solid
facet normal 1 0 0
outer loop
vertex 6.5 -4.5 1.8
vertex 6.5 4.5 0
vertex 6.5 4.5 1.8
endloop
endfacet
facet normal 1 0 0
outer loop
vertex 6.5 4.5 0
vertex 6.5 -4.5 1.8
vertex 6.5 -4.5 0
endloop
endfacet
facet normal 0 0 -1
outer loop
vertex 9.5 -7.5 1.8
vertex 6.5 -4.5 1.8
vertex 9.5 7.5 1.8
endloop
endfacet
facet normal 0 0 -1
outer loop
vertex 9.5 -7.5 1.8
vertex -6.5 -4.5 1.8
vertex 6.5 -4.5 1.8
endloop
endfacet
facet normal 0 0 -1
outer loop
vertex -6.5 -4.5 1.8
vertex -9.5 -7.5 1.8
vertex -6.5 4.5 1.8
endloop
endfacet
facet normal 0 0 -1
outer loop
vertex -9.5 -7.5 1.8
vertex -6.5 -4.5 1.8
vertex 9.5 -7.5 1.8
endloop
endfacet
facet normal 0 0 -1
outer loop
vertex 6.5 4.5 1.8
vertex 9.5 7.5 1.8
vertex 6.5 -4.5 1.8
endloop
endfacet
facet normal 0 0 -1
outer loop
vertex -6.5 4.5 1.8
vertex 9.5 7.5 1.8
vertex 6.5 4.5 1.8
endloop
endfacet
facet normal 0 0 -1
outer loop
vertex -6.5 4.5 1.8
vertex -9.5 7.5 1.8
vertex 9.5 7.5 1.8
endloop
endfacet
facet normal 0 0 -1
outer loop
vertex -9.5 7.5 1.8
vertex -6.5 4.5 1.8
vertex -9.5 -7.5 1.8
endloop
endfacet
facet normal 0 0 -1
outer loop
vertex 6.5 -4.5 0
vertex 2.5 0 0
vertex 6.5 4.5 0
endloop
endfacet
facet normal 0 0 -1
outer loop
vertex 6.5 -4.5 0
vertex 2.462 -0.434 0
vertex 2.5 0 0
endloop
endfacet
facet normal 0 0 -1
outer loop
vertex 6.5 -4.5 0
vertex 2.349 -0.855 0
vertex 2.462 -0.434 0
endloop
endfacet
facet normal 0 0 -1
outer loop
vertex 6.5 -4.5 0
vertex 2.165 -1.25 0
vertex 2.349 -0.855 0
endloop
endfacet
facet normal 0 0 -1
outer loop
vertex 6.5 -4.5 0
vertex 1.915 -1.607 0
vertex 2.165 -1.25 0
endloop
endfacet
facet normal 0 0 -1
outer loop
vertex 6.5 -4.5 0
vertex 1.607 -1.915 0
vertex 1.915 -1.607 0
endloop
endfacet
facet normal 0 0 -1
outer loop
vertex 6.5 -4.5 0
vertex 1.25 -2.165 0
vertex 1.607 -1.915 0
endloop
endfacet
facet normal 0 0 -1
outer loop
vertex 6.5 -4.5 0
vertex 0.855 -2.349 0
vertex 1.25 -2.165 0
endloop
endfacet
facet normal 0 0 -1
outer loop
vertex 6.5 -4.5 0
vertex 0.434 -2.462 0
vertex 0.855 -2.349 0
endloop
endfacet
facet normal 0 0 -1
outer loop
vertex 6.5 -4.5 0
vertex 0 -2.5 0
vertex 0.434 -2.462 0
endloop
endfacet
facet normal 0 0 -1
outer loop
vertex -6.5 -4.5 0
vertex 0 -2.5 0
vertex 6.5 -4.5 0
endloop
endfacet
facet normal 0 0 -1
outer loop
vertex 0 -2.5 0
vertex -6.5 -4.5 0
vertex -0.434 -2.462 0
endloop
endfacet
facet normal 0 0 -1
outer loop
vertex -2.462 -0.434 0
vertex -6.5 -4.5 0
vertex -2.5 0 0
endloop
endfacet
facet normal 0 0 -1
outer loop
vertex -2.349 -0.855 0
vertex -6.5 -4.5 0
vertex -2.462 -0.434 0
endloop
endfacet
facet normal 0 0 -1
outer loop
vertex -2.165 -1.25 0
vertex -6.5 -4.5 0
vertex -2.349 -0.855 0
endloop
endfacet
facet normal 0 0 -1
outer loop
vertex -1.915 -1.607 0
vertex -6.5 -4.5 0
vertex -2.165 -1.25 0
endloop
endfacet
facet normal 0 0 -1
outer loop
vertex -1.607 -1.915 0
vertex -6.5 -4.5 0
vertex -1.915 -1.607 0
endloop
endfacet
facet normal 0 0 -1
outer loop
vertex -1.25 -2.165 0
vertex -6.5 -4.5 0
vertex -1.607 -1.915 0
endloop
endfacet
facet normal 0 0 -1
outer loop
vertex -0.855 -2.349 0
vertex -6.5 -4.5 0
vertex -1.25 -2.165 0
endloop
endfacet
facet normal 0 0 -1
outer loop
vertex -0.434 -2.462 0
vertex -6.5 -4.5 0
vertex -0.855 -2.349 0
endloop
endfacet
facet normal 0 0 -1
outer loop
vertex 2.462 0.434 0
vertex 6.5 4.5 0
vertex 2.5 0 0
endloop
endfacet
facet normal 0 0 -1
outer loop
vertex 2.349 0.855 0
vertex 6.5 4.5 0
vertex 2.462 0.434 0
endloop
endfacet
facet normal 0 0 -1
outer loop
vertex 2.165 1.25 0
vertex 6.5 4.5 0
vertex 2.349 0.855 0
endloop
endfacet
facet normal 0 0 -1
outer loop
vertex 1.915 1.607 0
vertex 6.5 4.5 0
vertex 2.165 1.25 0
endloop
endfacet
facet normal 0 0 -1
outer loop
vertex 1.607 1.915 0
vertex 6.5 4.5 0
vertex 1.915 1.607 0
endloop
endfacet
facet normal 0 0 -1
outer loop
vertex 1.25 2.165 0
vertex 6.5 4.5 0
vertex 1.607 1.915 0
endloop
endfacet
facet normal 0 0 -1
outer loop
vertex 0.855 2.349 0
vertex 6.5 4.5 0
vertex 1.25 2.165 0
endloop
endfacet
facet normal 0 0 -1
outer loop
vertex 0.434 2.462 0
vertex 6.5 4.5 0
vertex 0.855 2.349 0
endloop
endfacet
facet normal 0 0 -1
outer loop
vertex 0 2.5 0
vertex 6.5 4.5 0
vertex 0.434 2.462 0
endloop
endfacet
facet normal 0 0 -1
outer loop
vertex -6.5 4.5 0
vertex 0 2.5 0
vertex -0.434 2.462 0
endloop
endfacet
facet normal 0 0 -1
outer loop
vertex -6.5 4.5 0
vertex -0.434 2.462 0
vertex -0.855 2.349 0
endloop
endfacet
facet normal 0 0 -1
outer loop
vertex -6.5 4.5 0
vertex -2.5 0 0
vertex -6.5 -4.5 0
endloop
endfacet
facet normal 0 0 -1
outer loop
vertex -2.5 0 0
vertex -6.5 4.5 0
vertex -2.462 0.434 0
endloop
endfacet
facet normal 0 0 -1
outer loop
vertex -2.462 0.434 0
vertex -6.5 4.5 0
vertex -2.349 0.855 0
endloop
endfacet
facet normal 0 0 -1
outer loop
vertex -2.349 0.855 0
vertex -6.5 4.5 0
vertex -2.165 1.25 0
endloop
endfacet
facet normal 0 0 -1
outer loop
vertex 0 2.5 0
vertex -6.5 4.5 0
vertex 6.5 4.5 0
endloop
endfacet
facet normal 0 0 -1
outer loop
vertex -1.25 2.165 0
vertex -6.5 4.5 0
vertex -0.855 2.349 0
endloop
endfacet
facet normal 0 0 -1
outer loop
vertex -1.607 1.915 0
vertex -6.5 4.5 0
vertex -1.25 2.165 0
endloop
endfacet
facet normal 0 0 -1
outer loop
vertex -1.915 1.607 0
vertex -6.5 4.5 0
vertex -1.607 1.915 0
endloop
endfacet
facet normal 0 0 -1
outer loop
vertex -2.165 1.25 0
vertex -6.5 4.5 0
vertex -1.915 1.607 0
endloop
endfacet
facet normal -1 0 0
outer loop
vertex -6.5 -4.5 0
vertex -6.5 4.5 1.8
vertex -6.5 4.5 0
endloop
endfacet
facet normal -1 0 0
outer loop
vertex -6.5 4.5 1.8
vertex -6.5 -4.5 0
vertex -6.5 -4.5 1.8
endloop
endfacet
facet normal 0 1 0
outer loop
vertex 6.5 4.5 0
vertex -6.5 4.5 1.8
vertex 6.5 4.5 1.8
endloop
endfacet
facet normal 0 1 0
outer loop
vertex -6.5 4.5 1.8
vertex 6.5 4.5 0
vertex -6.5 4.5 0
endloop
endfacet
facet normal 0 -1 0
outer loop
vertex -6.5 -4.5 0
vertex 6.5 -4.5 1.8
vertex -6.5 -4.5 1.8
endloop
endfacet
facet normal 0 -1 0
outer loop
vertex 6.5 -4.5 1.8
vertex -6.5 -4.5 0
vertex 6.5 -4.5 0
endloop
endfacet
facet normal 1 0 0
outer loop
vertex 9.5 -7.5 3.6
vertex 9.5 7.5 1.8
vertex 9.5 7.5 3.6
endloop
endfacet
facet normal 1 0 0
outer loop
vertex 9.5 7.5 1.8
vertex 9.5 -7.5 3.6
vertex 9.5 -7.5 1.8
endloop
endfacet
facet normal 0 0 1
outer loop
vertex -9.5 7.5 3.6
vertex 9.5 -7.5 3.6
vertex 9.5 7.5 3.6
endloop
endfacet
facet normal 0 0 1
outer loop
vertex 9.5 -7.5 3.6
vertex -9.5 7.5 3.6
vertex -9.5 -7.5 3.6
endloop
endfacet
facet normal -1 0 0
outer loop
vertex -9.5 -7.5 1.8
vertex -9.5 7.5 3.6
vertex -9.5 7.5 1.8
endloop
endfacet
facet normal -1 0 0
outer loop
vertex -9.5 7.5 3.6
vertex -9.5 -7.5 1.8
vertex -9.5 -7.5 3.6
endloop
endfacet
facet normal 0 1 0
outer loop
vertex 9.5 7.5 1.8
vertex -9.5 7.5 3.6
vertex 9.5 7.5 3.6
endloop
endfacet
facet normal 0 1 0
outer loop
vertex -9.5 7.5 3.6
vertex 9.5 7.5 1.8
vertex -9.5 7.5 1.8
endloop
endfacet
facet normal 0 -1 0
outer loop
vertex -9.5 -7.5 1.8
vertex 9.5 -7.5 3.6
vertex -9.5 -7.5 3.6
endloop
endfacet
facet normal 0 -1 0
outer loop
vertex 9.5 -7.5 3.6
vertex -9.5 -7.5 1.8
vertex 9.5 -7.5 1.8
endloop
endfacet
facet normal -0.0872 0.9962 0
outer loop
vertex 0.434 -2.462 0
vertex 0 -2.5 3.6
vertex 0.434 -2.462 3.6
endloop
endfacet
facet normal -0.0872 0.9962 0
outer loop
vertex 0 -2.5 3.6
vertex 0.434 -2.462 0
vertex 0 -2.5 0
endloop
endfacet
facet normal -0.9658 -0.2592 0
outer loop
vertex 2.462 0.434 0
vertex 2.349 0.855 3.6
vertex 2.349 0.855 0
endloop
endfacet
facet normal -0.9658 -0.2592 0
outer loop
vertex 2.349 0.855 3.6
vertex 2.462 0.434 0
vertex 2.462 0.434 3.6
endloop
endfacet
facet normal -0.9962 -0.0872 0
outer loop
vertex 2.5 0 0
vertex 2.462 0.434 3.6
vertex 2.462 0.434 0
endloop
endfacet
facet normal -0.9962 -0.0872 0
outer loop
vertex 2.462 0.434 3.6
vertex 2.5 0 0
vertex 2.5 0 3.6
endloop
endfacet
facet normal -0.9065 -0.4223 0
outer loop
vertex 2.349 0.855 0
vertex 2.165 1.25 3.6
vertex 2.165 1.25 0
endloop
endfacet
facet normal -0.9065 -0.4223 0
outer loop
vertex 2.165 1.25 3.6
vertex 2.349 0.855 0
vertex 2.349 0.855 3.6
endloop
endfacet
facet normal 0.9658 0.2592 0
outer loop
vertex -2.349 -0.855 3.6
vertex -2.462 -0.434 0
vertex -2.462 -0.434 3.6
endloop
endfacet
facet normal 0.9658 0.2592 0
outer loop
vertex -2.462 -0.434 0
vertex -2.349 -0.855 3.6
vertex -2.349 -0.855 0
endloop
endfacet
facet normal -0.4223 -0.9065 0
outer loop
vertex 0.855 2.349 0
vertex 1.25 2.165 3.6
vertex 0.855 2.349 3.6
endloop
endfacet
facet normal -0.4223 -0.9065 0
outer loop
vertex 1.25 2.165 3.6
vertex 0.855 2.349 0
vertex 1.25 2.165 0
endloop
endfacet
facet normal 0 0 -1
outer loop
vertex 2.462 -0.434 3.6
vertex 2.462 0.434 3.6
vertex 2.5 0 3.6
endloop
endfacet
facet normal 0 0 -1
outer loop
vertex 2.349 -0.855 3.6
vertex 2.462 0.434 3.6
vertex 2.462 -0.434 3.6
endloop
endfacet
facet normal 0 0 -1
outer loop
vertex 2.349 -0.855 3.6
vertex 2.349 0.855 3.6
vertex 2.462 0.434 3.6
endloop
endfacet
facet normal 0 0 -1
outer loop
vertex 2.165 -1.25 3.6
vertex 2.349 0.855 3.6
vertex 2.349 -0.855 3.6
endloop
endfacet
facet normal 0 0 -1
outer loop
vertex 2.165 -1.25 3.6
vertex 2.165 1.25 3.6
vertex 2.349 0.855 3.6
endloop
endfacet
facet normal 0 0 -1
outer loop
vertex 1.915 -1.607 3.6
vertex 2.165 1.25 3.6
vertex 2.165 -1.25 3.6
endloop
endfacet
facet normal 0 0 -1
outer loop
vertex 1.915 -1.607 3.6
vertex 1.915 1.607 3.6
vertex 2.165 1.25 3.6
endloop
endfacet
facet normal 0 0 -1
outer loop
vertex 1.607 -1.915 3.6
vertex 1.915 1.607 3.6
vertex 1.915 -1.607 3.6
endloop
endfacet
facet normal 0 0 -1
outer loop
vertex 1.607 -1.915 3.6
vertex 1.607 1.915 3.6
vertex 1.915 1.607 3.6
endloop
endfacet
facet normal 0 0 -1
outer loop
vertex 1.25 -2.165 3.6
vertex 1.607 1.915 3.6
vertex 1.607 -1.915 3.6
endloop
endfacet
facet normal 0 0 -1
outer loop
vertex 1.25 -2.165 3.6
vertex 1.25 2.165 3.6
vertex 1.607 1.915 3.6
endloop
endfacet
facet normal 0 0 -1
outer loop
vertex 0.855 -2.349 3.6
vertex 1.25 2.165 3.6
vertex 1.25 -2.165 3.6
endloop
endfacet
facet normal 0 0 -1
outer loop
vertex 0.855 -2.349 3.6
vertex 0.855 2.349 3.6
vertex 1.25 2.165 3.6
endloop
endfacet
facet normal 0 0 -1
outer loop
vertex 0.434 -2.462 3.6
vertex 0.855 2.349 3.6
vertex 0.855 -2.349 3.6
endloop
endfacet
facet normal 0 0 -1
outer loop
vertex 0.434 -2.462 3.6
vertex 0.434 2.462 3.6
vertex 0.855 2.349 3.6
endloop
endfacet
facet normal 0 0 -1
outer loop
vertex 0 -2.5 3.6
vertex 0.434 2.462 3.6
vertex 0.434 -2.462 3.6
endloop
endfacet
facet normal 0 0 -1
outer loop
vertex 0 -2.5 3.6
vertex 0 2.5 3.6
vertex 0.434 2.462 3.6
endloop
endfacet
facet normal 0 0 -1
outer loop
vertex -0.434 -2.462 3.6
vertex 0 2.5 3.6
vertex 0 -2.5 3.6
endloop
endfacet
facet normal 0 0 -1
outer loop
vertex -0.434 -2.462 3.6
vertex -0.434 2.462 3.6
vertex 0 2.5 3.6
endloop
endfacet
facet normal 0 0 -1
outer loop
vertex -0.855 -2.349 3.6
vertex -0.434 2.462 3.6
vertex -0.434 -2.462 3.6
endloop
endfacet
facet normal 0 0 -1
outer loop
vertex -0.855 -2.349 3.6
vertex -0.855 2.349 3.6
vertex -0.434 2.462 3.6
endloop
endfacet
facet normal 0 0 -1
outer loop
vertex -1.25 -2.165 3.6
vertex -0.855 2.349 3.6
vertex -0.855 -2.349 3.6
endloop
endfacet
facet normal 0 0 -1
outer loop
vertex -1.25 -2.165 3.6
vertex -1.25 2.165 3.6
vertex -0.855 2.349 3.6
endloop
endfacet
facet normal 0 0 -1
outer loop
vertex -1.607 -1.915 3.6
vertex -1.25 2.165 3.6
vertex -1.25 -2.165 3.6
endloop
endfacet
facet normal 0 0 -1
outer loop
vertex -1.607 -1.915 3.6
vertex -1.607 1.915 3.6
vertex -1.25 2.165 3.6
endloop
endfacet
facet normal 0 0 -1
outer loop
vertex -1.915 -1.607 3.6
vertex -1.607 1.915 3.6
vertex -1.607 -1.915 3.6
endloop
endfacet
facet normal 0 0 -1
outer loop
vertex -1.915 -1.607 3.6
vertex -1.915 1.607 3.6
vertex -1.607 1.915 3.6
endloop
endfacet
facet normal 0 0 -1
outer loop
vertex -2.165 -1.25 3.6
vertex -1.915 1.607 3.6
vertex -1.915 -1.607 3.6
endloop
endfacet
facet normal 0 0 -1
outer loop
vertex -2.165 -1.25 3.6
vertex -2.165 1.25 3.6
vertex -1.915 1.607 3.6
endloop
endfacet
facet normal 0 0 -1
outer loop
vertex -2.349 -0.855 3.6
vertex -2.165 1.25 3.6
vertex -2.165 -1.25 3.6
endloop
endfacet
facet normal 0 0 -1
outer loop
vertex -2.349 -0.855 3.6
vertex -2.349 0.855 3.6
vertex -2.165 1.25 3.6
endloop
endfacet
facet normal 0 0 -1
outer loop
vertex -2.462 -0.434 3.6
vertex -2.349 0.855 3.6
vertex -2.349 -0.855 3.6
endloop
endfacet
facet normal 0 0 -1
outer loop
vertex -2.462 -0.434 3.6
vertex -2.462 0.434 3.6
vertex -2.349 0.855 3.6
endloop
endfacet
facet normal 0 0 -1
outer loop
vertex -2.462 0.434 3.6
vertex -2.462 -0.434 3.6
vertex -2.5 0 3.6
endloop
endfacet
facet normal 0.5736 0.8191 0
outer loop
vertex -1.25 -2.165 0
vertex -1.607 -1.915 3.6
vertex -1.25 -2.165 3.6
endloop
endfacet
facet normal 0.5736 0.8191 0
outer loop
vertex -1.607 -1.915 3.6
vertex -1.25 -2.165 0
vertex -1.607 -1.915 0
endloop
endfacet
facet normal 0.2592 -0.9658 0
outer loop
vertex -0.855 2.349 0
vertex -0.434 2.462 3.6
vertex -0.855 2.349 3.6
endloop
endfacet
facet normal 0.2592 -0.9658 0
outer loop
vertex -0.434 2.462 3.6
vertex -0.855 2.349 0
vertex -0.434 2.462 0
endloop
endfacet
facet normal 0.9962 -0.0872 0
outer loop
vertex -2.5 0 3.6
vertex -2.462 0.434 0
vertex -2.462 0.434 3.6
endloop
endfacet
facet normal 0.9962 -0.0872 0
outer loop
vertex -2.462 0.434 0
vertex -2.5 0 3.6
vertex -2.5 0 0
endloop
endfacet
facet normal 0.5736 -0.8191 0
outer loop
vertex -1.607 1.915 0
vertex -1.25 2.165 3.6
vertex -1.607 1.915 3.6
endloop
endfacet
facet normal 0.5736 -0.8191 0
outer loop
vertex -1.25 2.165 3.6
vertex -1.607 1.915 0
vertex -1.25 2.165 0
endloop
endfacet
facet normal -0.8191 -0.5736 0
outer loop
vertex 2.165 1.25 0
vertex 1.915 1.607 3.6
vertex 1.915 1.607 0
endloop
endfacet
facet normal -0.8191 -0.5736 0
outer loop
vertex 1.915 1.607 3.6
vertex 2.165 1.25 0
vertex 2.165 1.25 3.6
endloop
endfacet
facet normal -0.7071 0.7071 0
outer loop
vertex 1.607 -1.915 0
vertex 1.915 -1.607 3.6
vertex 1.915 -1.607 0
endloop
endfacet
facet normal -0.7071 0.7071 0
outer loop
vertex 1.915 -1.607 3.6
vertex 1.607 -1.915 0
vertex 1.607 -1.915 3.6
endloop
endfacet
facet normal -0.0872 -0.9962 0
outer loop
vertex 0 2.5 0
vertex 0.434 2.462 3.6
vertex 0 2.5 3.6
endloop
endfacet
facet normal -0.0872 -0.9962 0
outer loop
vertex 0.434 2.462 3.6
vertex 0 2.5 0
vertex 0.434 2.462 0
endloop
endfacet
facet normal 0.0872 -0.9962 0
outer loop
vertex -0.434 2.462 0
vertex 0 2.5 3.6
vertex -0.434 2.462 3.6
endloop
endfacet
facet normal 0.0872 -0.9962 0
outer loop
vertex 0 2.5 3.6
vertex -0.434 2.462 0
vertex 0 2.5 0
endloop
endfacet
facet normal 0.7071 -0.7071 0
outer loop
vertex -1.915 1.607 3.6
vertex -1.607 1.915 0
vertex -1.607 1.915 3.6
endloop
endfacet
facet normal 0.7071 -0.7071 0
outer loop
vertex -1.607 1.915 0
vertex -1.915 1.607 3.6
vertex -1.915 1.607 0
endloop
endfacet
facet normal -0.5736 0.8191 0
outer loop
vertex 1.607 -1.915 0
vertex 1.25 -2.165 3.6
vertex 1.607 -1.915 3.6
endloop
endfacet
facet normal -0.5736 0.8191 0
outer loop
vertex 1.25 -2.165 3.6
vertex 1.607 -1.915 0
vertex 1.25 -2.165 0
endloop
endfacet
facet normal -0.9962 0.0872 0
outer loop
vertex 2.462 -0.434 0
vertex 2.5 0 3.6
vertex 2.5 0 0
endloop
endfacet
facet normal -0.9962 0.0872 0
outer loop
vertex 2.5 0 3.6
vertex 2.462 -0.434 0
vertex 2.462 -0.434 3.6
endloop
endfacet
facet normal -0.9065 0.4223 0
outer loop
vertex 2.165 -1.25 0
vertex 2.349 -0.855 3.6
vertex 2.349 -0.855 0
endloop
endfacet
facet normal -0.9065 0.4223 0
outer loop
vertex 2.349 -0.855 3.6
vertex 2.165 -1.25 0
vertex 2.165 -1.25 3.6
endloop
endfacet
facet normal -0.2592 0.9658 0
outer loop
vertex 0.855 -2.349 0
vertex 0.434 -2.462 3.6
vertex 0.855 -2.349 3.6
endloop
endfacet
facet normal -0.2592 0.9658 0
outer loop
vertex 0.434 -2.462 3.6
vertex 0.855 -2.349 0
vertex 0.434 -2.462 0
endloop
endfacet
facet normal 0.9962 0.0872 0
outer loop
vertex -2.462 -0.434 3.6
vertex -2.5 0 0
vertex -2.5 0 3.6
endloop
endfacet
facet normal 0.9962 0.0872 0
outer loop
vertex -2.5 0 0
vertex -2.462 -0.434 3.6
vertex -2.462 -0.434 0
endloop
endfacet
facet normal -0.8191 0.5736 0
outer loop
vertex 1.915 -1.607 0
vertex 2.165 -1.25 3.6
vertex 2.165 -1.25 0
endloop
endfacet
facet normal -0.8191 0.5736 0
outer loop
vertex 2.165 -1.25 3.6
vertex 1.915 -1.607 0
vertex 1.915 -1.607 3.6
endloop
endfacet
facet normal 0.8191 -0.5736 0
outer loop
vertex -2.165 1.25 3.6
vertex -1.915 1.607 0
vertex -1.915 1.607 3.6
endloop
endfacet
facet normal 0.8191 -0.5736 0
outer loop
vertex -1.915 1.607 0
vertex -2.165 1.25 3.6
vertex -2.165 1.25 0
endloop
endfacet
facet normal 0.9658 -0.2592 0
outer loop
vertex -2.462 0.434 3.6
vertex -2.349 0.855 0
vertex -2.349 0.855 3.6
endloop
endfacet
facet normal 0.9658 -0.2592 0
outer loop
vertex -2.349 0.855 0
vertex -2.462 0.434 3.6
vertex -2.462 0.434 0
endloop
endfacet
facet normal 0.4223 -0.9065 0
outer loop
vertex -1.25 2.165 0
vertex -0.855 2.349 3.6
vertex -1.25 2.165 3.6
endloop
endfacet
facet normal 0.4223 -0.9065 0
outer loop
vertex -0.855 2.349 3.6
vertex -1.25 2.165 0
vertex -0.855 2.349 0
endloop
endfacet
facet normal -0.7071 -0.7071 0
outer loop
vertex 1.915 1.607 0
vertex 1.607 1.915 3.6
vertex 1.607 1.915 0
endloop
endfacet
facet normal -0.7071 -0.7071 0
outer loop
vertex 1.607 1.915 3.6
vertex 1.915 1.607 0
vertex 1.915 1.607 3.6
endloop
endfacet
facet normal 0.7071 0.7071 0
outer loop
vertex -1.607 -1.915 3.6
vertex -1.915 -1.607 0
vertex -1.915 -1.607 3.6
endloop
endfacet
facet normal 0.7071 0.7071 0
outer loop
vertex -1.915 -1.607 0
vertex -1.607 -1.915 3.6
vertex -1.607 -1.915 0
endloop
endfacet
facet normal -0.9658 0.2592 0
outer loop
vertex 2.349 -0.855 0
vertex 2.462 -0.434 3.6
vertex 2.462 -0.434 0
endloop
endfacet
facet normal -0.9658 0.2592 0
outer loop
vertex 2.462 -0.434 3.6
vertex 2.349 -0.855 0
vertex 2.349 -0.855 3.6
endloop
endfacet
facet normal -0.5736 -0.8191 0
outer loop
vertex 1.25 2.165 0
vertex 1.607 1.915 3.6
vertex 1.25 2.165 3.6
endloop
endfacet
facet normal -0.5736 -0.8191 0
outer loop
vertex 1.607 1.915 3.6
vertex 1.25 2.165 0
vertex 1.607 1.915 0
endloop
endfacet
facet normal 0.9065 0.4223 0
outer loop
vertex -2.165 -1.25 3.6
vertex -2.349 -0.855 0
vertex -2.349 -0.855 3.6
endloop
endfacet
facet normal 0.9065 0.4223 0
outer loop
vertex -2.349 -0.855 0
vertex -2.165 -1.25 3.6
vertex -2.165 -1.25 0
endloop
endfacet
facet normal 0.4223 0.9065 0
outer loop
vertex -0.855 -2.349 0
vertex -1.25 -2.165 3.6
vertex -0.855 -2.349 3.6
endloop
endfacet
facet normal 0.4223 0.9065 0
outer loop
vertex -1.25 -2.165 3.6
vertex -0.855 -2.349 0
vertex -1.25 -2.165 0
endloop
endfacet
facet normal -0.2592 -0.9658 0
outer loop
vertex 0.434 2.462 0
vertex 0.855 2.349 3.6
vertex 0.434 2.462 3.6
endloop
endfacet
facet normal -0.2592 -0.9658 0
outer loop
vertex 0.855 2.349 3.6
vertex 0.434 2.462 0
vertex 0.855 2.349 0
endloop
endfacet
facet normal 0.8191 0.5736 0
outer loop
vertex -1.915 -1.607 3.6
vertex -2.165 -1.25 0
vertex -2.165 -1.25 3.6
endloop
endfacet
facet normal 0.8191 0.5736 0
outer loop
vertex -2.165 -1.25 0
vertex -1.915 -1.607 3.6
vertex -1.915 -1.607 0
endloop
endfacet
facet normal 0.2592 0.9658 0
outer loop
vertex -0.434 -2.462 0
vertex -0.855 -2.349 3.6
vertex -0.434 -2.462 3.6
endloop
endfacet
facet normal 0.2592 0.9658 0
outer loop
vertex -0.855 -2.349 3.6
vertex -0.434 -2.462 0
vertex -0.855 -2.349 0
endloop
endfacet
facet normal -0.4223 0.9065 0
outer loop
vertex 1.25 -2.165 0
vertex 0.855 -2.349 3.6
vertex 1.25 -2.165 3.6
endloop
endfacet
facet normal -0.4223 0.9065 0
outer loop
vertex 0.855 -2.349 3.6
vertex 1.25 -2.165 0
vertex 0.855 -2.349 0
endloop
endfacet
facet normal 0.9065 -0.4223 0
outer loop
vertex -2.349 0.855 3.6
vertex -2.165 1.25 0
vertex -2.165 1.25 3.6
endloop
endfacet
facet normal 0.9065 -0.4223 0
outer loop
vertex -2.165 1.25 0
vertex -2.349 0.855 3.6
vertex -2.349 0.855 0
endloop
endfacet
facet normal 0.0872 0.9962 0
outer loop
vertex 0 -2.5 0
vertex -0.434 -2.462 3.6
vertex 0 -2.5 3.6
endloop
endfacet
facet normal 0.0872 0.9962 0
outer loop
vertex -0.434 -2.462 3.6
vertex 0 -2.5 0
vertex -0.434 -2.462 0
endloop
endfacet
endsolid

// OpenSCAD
$fn=36;

//thickness
t=1.8;
//inner height
ih=13;
//inner width
iw=9;
//outer border on each side
ob=3;

module plate()
{
cube([ih,iw,t],true);

translate([0,0,t])
cube([ih+ob*2,iw+ob*2,t], true);
}

difference()
{
  translate([0,0,t/2])
  plate();
  cylinder(h=t*2, d1=5, d2=5);
}
